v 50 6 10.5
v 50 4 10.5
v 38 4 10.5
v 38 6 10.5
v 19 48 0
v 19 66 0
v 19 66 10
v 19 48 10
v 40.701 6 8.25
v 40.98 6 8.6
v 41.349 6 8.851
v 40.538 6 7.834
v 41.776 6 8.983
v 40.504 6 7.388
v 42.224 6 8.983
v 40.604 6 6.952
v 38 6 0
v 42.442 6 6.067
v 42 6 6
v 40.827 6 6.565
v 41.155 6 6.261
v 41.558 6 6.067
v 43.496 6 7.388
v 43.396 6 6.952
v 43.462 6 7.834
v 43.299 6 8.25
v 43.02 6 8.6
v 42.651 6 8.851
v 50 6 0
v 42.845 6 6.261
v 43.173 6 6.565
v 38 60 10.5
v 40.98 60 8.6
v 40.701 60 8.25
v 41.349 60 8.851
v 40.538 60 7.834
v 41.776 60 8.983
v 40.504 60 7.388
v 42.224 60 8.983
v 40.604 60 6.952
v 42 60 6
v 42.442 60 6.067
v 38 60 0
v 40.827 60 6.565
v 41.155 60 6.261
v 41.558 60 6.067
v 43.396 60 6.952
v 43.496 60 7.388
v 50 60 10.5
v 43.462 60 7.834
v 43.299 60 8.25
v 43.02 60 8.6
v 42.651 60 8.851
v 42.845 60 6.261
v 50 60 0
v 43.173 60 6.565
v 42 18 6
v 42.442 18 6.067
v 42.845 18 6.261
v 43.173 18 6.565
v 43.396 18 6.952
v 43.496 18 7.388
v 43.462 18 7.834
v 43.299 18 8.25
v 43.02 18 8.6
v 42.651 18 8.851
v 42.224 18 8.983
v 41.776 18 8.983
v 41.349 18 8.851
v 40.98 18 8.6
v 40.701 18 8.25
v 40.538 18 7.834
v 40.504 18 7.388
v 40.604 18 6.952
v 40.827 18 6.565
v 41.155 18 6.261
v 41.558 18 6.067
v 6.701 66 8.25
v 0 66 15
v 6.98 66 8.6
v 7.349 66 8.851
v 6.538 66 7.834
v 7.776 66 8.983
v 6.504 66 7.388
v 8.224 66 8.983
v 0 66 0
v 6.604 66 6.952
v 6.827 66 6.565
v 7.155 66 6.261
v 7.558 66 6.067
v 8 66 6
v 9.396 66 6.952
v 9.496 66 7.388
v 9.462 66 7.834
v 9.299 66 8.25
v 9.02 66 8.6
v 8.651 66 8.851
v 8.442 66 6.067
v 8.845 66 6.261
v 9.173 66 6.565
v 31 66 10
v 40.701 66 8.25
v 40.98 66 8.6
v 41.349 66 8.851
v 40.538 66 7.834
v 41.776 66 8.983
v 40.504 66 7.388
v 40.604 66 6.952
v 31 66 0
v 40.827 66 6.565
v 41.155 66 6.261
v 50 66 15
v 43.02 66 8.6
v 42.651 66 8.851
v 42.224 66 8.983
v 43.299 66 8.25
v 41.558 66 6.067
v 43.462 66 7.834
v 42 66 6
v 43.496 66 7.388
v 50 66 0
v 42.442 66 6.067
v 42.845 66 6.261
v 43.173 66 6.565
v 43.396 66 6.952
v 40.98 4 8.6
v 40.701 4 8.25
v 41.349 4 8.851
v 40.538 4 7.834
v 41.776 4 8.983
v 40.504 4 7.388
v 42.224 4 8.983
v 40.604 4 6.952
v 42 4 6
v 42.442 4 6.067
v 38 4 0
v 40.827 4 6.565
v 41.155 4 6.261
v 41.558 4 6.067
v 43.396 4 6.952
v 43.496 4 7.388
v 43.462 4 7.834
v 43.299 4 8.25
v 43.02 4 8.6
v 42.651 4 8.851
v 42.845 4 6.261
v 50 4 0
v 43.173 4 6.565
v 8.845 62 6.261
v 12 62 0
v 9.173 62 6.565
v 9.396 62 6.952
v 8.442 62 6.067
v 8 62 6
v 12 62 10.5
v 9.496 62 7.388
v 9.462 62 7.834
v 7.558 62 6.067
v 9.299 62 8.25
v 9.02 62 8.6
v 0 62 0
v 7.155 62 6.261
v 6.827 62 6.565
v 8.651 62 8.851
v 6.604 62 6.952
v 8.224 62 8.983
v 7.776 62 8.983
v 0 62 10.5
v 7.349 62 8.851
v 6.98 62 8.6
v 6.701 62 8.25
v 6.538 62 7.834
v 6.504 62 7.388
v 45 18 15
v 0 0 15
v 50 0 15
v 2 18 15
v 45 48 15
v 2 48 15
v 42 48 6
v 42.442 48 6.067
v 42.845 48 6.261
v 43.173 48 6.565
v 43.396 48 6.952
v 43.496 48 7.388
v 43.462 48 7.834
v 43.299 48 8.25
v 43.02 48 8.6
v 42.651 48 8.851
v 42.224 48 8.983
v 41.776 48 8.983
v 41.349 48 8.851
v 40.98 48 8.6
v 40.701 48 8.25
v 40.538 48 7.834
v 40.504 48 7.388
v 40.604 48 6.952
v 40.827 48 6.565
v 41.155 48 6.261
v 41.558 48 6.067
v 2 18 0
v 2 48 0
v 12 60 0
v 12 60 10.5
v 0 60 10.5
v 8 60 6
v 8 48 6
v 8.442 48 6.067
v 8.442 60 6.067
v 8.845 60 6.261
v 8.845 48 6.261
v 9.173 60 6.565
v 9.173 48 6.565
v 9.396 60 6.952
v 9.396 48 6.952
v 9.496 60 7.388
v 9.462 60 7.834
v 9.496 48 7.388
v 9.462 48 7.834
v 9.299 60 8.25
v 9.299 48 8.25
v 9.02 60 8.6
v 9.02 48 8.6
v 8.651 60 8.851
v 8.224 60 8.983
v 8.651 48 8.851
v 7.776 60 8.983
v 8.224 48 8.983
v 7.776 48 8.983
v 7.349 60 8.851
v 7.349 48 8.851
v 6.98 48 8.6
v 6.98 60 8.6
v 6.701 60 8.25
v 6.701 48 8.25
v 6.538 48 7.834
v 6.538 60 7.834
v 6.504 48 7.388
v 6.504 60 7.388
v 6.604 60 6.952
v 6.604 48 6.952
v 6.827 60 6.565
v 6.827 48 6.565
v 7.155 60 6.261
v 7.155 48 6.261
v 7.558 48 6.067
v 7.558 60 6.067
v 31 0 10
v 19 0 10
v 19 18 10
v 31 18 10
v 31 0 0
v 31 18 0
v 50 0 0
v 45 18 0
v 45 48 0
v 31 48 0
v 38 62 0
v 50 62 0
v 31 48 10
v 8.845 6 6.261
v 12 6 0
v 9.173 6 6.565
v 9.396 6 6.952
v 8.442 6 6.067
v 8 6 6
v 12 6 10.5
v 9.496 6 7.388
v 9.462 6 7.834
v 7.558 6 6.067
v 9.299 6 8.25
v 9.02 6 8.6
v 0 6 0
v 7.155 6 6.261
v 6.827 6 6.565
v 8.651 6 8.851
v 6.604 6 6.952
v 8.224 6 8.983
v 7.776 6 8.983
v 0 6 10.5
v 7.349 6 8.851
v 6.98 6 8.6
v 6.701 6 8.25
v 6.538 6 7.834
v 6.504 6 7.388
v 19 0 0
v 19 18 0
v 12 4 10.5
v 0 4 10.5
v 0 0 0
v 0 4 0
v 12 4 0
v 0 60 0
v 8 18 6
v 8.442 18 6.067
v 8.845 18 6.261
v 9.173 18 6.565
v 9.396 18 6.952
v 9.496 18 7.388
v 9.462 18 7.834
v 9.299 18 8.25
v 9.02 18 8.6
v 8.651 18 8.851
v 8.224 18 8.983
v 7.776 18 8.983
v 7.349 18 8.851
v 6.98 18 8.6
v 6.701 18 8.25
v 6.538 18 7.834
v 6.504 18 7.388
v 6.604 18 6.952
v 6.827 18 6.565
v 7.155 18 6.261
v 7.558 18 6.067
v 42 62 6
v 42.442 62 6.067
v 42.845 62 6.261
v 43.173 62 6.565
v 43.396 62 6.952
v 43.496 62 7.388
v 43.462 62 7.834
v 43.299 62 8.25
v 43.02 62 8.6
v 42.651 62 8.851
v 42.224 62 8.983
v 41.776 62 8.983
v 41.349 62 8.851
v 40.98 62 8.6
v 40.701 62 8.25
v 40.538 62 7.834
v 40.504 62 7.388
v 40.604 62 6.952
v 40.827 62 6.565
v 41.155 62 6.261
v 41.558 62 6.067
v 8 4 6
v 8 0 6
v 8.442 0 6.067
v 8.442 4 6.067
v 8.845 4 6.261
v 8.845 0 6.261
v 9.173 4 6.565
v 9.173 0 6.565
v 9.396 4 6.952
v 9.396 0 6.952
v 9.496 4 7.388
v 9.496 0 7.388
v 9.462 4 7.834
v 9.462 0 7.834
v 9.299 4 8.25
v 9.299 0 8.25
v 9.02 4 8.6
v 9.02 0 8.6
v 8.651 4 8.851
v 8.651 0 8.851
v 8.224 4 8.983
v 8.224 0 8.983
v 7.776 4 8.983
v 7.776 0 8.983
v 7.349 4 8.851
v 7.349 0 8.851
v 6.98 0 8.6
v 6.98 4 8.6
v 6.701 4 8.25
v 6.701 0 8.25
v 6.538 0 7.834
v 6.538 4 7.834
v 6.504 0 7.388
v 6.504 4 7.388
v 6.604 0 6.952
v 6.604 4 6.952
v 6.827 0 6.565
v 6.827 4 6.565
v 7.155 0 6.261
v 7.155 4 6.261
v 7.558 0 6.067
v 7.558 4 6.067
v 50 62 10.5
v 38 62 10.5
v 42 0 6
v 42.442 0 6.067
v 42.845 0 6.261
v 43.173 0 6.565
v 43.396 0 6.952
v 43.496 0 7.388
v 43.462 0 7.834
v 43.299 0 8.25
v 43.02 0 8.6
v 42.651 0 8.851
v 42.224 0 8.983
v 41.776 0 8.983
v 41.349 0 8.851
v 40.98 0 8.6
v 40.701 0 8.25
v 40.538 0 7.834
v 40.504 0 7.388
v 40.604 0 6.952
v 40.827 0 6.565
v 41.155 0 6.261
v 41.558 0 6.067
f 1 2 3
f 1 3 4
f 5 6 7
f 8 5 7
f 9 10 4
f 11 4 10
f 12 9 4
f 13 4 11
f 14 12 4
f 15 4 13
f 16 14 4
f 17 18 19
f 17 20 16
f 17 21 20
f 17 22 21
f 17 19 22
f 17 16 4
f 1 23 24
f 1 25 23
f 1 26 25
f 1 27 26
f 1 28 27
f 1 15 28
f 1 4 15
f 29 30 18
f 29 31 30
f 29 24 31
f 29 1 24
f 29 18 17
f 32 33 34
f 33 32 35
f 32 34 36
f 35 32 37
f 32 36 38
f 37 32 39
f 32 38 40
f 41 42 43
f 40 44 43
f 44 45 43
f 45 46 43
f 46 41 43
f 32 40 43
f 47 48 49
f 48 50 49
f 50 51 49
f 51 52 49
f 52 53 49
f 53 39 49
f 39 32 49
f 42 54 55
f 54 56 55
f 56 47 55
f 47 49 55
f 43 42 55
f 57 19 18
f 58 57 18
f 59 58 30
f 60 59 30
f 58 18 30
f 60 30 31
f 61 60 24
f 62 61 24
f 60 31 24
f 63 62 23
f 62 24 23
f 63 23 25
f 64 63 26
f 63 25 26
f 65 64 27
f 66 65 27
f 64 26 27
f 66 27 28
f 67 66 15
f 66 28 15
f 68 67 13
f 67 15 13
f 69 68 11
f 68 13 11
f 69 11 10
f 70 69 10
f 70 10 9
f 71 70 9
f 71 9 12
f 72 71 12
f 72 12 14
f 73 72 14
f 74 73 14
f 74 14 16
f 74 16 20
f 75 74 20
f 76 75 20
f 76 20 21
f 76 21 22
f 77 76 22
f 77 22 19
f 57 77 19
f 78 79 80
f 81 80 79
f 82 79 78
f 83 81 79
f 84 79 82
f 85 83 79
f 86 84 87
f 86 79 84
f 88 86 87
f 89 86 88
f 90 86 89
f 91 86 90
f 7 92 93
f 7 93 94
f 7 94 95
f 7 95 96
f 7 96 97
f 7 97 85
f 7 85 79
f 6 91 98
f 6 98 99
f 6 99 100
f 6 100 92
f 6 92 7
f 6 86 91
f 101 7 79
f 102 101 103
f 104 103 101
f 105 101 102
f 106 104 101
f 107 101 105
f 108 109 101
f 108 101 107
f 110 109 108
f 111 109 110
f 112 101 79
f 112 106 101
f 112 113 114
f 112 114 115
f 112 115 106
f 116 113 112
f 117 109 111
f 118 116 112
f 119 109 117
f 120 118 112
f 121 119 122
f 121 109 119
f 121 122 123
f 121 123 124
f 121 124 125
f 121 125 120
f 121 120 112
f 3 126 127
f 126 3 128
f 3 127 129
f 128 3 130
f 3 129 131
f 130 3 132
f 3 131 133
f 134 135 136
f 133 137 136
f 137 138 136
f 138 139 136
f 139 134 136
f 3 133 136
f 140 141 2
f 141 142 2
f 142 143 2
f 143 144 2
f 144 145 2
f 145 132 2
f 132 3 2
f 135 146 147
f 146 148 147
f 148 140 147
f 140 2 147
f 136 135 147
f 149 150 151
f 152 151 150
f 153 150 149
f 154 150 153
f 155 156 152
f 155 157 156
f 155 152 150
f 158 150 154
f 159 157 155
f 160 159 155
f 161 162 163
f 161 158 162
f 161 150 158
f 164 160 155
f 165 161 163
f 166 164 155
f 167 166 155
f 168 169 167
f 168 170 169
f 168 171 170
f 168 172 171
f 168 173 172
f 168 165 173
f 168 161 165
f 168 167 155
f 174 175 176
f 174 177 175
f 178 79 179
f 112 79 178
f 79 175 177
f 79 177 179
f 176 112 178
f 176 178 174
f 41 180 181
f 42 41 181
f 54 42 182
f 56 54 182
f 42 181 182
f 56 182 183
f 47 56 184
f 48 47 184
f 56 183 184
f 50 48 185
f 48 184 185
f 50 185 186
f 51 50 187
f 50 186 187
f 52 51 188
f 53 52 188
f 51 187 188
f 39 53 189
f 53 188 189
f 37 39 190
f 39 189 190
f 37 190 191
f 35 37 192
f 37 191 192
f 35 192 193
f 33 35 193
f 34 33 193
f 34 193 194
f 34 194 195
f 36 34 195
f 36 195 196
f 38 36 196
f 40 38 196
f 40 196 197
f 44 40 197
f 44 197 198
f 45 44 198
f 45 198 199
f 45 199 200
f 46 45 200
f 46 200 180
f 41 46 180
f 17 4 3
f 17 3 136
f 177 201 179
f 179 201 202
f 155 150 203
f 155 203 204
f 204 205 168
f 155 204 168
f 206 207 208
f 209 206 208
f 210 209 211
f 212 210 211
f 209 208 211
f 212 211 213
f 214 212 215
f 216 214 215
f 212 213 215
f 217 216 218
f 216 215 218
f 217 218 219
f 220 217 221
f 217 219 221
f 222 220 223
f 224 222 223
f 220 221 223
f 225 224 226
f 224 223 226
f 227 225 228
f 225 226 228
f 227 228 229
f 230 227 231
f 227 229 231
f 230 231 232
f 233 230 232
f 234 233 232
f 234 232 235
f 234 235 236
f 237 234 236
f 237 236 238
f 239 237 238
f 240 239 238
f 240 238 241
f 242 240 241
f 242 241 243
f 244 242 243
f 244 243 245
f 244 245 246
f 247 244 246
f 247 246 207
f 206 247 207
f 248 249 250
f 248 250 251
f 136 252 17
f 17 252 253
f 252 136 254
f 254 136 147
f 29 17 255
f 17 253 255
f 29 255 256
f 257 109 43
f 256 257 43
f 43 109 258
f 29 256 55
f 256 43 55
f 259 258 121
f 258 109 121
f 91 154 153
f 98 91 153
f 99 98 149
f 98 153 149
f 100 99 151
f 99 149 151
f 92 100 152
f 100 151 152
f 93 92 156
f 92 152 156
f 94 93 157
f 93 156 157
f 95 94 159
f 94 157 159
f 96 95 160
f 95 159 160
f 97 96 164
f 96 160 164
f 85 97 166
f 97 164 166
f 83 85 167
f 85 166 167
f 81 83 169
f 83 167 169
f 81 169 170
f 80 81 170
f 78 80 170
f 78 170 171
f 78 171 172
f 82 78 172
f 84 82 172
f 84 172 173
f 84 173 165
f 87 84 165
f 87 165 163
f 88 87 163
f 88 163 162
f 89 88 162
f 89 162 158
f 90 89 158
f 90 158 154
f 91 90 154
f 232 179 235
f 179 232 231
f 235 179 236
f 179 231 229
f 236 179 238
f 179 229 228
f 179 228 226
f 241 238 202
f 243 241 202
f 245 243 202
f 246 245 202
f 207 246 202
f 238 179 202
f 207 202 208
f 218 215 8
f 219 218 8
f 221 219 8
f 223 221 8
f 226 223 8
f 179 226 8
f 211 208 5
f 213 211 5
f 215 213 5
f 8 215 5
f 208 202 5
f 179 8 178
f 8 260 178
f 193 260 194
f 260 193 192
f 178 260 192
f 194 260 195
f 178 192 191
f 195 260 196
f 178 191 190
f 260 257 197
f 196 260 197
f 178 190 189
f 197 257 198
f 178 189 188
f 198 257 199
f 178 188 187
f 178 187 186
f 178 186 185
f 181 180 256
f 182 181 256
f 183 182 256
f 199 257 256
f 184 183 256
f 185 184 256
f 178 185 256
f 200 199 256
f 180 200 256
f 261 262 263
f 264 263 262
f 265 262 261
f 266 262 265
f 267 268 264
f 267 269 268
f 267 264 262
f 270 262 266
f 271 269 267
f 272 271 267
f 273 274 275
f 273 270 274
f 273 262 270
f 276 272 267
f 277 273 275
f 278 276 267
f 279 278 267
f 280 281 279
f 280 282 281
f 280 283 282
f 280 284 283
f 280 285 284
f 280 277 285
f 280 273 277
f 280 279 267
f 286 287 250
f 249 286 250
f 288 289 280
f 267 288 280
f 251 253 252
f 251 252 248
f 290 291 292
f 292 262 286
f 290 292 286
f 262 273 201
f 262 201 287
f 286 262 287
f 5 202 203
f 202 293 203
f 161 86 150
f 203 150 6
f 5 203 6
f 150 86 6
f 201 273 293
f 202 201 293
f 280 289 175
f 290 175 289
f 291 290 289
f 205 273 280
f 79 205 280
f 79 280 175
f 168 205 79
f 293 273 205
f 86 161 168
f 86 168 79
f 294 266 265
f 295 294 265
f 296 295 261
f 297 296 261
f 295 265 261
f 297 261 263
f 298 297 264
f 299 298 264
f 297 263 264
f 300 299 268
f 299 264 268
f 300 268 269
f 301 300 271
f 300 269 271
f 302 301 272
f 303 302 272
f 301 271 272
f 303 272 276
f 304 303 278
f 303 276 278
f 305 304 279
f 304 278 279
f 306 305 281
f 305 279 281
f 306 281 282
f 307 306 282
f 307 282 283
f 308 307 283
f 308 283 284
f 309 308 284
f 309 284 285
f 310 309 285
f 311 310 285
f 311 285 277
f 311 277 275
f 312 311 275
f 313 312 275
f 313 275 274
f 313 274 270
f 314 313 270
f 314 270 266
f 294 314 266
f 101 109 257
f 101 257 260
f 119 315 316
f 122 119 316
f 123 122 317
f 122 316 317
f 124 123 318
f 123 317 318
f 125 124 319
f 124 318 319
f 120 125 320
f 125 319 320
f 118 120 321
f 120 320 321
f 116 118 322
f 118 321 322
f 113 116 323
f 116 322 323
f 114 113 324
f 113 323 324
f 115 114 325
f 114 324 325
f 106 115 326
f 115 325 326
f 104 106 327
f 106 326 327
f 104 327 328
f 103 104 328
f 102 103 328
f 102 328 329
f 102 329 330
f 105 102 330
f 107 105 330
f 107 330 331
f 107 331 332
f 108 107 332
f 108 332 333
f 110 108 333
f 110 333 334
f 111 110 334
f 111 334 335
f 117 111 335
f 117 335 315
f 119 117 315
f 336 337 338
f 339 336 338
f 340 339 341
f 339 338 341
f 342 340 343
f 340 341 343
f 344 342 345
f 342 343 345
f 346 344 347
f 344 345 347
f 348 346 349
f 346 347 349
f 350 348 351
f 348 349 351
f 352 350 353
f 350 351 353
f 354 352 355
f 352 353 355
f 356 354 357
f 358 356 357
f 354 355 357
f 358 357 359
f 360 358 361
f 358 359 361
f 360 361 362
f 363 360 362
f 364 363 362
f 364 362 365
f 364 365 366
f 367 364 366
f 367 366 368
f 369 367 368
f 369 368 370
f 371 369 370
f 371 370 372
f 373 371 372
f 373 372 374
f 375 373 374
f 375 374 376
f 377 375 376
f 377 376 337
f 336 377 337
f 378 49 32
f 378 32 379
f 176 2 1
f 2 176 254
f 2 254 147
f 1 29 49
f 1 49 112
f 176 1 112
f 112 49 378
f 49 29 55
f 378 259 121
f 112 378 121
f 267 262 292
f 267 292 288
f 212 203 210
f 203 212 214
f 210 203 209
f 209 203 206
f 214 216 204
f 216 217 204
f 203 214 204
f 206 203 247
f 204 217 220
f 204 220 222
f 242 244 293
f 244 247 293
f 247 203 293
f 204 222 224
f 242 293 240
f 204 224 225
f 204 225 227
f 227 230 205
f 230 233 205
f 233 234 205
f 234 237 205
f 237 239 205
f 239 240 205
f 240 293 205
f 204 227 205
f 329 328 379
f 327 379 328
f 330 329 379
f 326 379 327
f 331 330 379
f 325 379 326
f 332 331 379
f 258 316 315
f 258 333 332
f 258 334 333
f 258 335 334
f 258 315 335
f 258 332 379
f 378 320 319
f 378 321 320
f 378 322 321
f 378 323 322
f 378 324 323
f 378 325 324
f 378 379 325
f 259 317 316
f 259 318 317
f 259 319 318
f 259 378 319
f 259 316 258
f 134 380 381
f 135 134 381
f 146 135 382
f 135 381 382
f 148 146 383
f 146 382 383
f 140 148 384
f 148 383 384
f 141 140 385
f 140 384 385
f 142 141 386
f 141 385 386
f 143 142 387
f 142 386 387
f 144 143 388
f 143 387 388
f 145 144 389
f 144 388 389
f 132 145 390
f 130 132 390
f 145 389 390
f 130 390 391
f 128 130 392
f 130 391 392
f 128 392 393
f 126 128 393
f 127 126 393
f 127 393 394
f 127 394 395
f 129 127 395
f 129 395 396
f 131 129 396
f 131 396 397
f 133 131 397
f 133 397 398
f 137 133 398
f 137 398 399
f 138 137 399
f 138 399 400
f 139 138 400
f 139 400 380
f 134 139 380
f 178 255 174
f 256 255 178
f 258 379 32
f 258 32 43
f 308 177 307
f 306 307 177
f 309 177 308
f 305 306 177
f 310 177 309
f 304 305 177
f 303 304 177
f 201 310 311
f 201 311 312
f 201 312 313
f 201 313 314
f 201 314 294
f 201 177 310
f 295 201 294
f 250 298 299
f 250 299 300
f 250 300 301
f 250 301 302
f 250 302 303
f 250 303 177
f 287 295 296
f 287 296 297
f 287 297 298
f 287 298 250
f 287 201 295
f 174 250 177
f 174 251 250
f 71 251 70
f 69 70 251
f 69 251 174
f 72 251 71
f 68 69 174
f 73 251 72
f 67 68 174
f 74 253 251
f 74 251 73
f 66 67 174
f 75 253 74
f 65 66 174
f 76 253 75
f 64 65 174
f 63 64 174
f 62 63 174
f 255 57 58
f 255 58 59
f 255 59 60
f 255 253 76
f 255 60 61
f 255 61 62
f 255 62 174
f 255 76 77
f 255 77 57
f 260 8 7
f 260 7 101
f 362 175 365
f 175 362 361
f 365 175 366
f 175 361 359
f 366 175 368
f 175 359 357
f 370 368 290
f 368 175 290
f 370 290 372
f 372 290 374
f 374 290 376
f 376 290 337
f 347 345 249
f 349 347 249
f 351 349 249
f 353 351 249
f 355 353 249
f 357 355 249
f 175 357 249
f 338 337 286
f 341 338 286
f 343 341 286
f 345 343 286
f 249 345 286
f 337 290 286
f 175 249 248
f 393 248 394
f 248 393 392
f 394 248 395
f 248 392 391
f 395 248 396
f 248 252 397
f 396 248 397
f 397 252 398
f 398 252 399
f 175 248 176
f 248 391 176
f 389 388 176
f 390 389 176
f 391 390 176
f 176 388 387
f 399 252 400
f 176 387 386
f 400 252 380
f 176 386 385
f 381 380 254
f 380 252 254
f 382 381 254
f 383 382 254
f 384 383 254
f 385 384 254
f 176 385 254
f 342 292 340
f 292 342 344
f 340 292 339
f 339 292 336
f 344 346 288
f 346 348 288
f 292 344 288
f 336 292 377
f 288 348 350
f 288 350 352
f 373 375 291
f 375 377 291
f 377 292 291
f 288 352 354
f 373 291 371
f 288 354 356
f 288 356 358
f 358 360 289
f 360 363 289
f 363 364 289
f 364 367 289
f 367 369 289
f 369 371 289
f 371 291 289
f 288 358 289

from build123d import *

# Parameters (mm, degrees)
CROQUIS1_W              = 50
CROQUIS1_H              = 66
CROQUIS1_W_2            = 43
CROQUIS1_H_2            = 30
SALIENTE_EXTRUIR1_DEPTH = 15
CROQUIS2_R              = 1.5
CROQUIS2_W              = 12
CROQUIS2_H              = 10
CORTAR_EXTRUIR5_DEPTH   = 67
CROQUIS3_W              = 10.5
CROQUIS3_H              = 2
CORTAR_EXTRUIR2_DEPTH   = 12
CROQUIS5_W              = 10.5
CROQUIS5_H              = 2
CORTAR_EXTRUIR3_DEPTH   = 12


with BuildPart() as part:
    # Croquis1 → Saliente-Extruir1 (new body)
    with BuildSketch(Plane.XY):
        with Locations((25, 33)):
            Rectangle(CROQUIS1_W, CROQUIS1_H)
        with Locations((23.5, 33)):
            Rectangle(CROQUIS1_W_2, CROQUIS1_H_2, mode=Mode.SUBTRACT)
    extrude(amount=SALIENTE_EXTRUIR1_DEPTH)

    # Croquis2 → Cortar-Extruir5 (cut, through all)
    with BuildSketch(Plane.XZ):
        with Locations(Location((42, 7.5, 0), (0, 0, 270))):  # turned: the seam where the file's is
            Circle(CROQUIS2_R)
        with Locations(Location((8, 7.5, 0), (0, 0, 270))):  # turned: the seam where the file's is
            Circle(CROQUIS2_R)
        with Locations((25, 5)):
            Rectangle(CROQUIS2_W, CROQUIS2_H)
    extrude(amount=-CORTAR_EXTRUIR5_DEPTH, mode=Mode.SUBTRACT)

    # Croquis3 → Cortar-Extruir2 (cut)
    with BuildSketch(Plane.ZY):
        with Locations((5.25, 61)):
            Rectangle(CROQUIS3_W, CROQUIS3_H)
        with Locations((5.25, 5)):
            Rectangle(CROQUIS3_W, CROQUIS3_H)
    extrude(amount=-CORTAR_EXTRUIR2_DEPTH, mode=Mode.SUBTRACT)

    # Croquis5 → Cortar-Extruir3 (cut)
    with BuildSketch(Plane(origin=(50, 0, 0), x_dir=(0, 0, -1), z_dir=(1, 0, 0))):
        with Locations((-5.25, 5)):
            Rectangle(CROQUIS5_W, CROQUIS5_H)
        with Locations((-5.25, 61)):
            Rectangle(CROQUIS5_W, CROQUIS5_H)
    extrude(amount=-CORTAR_EXTRUIR3_DEPTH, mode=Mode.SUBTRACT)


solid = part.part
